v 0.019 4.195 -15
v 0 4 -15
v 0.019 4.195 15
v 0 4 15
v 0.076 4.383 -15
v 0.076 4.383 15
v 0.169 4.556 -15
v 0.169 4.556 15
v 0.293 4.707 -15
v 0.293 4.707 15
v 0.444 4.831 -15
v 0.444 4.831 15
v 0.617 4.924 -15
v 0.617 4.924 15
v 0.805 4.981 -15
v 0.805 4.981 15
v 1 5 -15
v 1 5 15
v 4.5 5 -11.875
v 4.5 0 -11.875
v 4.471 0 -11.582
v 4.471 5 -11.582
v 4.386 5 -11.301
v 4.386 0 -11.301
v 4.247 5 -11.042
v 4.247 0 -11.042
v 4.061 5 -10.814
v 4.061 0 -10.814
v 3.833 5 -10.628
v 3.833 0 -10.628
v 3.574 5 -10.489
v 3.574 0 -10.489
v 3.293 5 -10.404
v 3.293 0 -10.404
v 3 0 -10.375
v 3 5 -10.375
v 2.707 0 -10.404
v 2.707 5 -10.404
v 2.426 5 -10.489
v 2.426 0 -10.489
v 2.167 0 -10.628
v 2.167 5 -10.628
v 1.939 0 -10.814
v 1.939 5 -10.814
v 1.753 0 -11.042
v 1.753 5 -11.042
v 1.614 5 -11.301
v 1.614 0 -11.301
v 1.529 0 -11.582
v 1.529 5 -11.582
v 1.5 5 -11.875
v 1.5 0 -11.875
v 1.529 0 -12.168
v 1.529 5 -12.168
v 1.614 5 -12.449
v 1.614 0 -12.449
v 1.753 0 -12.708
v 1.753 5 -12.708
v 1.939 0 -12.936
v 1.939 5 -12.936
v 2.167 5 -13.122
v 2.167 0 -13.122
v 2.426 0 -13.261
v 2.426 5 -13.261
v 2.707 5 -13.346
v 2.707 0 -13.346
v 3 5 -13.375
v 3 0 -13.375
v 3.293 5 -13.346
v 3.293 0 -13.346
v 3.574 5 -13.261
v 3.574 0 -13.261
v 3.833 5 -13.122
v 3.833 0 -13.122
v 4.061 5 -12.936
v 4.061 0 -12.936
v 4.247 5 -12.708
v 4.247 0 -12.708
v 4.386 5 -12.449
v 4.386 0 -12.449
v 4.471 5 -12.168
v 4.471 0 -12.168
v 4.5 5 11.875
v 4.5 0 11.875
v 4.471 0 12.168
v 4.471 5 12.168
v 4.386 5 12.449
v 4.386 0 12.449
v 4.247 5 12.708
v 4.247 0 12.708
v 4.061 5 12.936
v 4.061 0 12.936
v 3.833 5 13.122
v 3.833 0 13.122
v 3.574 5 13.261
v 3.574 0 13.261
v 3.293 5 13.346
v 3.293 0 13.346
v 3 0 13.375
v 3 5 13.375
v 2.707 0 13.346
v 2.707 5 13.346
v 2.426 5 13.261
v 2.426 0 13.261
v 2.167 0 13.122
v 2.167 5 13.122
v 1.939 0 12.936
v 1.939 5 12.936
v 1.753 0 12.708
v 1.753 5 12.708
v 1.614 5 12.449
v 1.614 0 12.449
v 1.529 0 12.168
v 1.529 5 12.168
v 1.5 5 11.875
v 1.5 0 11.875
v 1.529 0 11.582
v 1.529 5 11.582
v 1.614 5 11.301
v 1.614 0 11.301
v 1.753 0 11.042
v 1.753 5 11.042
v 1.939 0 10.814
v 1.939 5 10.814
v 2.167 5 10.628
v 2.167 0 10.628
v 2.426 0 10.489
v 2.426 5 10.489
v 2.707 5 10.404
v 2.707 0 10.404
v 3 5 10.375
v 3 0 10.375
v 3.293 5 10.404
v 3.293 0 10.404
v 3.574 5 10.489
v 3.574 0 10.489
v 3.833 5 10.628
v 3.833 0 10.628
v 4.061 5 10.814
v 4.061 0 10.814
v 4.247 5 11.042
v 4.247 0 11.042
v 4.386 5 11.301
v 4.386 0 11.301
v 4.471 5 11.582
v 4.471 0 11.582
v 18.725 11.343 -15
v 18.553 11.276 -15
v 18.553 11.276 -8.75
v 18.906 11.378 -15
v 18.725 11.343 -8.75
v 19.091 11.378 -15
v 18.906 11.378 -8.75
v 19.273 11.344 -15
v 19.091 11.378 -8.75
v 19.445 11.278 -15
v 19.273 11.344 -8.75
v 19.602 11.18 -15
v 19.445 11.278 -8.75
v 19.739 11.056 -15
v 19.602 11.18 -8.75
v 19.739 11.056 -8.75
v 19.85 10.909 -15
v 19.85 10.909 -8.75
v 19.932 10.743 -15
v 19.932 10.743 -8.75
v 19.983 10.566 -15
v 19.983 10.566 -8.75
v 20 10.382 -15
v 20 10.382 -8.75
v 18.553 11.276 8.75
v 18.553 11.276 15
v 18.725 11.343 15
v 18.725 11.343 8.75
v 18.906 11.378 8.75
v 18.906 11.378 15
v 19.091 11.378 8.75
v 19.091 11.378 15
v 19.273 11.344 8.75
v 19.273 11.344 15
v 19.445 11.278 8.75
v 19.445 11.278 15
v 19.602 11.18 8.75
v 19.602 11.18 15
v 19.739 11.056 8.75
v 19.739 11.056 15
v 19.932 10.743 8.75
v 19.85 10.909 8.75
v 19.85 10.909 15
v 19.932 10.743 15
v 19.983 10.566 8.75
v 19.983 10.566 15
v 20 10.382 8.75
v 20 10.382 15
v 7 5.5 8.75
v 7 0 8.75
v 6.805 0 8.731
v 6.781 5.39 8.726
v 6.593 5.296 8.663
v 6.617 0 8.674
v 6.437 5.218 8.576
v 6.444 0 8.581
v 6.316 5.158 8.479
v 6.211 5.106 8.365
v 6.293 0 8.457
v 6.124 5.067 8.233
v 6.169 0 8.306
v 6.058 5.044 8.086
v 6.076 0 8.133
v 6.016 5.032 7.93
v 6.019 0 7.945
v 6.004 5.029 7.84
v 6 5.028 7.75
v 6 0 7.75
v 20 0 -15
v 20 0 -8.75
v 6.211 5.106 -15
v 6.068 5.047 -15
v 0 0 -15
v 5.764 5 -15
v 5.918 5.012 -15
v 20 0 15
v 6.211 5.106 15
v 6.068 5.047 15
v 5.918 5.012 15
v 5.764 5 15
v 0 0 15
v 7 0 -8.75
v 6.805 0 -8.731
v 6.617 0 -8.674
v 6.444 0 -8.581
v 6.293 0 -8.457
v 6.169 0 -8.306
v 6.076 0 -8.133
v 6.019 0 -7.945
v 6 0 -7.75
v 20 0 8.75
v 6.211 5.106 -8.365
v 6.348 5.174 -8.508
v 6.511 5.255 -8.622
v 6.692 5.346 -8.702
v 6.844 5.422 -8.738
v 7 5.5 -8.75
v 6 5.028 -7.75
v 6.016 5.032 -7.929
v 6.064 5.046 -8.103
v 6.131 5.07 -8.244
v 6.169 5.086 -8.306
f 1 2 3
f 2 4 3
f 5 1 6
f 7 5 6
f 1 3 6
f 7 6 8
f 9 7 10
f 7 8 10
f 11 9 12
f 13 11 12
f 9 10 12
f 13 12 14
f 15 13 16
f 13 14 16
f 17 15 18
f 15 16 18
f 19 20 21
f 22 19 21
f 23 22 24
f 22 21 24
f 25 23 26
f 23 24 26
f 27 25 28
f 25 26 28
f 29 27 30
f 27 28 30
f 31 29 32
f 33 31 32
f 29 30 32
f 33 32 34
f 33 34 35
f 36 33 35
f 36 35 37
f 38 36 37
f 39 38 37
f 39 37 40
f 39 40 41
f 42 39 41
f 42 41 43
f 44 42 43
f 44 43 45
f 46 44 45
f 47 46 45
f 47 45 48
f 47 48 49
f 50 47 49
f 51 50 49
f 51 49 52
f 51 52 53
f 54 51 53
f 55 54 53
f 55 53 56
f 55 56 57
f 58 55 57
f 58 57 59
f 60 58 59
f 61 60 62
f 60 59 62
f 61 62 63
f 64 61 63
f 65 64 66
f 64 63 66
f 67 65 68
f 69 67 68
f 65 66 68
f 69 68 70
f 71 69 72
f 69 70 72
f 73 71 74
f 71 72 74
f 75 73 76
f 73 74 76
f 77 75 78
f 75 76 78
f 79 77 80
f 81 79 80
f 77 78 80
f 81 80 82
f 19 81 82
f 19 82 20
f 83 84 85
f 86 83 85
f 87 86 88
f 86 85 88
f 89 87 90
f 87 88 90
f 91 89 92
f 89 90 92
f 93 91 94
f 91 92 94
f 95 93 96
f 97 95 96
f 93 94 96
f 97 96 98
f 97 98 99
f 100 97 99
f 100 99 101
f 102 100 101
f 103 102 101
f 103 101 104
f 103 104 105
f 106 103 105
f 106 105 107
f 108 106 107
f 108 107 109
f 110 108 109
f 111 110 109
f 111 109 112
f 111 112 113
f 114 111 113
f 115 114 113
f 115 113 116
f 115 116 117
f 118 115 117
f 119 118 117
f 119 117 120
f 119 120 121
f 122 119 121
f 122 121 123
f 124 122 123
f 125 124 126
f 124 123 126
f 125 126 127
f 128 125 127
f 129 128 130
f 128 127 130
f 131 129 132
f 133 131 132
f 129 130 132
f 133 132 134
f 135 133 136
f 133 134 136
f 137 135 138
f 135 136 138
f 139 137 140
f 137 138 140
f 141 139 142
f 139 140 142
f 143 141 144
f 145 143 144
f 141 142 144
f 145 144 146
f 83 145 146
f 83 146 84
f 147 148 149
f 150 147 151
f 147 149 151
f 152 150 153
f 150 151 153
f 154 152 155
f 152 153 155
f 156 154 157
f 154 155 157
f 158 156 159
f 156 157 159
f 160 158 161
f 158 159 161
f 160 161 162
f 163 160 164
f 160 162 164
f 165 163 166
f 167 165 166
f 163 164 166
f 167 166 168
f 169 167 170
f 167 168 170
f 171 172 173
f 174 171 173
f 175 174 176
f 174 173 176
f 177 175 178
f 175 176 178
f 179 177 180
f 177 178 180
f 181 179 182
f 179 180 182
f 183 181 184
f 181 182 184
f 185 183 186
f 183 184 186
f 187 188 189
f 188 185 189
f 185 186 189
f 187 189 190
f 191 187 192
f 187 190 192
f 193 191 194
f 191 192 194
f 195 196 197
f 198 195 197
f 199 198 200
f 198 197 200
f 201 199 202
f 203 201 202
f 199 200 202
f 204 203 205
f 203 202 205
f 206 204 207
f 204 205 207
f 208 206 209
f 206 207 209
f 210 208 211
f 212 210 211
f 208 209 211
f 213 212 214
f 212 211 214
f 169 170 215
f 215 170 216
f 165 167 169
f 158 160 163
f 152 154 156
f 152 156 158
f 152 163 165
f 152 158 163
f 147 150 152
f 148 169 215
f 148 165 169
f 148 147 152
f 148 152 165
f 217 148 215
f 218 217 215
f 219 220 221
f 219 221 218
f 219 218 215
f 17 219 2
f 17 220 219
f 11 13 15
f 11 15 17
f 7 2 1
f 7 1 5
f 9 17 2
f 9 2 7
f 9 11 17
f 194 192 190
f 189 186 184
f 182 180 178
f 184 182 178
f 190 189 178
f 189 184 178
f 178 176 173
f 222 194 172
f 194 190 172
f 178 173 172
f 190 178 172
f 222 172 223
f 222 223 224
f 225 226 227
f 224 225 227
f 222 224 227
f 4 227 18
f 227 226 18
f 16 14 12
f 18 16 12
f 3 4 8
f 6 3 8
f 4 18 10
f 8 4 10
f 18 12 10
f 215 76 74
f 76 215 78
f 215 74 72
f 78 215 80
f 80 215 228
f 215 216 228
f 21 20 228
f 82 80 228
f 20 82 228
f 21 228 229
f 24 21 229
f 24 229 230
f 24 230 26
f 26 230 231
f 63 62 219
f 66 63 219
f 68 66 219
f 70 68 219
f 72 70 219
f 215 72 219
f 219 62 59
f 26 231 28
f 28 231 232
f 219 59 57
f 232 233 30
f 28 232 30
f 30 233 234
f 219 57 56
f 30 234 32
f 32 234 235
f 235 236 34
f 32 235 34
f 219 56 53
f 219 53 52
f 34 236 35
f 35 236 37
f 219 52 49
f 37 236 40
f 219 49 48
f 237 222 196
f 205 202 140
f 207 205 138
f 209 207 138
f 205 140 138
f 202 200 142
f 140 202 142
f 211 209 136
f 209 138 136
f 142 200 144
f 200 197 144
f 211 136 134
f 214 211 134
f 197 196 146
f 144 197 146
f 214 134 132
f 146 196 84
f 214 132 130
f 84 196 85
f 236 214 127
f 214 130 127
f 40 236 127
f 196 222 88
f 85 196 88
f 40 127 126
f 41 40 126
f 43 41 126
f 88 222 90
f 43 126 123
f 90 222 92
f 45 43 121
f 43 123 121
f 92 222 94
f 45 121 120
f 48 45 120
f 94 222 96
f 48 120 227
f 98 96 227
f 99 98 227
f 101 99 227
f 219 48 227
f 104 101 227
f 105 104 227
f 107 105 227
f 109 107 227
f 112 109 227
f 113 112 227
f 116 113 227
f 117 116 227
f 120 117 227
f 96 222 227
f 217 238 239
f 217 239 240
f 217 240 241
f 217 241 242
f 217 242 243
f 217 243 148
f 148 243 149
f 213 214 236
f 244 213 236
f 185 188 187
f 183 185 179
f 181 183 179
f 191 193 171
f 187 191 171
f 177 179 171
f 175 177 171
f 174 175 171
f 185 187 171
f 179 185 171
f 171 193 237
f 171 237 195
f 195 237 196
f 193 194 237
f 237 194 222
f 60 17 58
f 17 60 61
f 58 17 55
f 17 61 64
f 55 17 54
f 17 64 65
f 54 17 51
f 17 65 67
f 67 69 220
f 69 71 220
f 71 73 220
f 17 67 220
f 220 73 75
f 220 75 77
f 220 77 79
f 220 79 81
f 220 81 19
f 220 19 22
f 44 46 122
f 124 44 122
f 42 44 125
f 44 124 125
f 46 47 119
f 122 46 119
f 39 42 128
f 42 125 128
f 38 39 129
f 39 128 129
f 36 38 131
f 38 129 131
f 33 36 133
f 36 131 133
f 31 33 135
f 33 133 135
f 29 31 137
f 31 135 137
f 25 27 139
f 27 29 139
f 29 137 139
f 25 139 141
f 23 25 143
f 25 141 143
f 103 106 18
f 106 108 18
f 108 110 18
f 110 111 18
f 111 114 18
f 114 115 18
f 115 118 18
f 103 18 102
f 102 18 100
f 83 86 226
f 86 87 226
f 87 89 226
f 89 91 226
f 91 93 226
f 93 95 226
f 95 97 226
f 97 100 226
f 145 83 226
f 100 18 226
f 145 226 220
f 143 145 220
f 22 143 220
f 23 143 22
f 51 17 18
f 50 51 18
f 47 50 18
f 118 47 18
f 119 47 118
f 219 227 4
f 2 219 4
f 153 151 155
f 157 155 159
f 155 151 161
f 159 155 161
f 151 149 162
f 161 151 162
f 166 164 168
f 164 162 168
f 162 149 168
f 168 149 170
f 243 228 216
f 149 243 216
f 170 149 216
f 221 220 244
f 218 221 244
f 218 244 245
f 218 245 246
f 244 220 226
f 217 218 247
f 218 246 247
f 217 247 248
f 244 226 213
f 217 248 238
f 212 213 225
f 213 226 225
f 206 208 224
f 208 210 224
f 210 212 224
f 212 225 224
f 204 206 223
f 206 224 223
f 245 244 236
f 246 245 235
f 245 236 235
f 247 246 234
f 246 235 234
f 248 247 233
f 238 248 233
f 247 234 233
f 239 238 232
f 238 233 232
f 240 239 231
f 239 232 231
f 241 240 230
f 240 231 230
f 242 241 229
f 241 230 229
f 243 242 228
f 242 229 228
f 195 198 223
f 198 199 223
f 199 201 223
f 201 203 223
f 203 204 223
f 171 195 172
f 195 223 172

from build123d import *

# Parameters (mm, degrees)
BOSS_EXTRUDE1_DEPTH = 15
SKETCH2_R           = 1.5
CUT_EXTRUDE1_DEPTH  = 30


with BuildPart() as part:
    # Sketch1 → Boss-Extrude1 (new, symmetric)
    with BuildSketch(Plane.XY):
        with BuildLine():
            Line((0, 0), (0, 4))
            ThreePointArc((0, 4), (0.292893219, 4.707106781), (1, 5))
            Line((1, 5), (5.763932023, 5))
            ThreePointArc((5.763932023, 5), (5.993684943, 5.026751011), (6.211145618, 5.105572809))
            Line((6.211145618, 5.105572809), (18.552786405, 11.276393202))
            ThreePointArc((18.552786405, 11.276393202), (19.525731112, 11.23261682), (20, 10.381966011))
            Line((20, 10.381966011), (20, 0))
            Line((20, 0), (0, 0))
        make_face()
    extrude(amount=BOSS_EXTRUDE1_DEPTH, both=True)

    # Sketch2 → Cut-Extrude1 (cut)
    with BuildSketch(Plane.XZ):
        with Locations((3, 11.875)):
            Circle(SKETCH2_R)
        with Locations((3, -11.875)):
            Circle(SKETCH2_R)
        with BuildLine():
            Line((20, -8.75), (20, 8.75))
            Line((20, 8.75), (7, 8.75))
            ThreePointArc((7, 8.75), (6.292893219, 8.457106781), (6, 7.75))
            Line((6, 7.75), (6, -7.75))
            ThreePointArc((6, -7.75), (6.292893219, -8.457106781), (7, -8.75))
            Line((7, -8.75), (20, -8.75))
        make_face()
    extrude(amount=-CUT_EXTRUDE1_DEPTH, mode=Mode.SUBTRACT)


solid = part.part
